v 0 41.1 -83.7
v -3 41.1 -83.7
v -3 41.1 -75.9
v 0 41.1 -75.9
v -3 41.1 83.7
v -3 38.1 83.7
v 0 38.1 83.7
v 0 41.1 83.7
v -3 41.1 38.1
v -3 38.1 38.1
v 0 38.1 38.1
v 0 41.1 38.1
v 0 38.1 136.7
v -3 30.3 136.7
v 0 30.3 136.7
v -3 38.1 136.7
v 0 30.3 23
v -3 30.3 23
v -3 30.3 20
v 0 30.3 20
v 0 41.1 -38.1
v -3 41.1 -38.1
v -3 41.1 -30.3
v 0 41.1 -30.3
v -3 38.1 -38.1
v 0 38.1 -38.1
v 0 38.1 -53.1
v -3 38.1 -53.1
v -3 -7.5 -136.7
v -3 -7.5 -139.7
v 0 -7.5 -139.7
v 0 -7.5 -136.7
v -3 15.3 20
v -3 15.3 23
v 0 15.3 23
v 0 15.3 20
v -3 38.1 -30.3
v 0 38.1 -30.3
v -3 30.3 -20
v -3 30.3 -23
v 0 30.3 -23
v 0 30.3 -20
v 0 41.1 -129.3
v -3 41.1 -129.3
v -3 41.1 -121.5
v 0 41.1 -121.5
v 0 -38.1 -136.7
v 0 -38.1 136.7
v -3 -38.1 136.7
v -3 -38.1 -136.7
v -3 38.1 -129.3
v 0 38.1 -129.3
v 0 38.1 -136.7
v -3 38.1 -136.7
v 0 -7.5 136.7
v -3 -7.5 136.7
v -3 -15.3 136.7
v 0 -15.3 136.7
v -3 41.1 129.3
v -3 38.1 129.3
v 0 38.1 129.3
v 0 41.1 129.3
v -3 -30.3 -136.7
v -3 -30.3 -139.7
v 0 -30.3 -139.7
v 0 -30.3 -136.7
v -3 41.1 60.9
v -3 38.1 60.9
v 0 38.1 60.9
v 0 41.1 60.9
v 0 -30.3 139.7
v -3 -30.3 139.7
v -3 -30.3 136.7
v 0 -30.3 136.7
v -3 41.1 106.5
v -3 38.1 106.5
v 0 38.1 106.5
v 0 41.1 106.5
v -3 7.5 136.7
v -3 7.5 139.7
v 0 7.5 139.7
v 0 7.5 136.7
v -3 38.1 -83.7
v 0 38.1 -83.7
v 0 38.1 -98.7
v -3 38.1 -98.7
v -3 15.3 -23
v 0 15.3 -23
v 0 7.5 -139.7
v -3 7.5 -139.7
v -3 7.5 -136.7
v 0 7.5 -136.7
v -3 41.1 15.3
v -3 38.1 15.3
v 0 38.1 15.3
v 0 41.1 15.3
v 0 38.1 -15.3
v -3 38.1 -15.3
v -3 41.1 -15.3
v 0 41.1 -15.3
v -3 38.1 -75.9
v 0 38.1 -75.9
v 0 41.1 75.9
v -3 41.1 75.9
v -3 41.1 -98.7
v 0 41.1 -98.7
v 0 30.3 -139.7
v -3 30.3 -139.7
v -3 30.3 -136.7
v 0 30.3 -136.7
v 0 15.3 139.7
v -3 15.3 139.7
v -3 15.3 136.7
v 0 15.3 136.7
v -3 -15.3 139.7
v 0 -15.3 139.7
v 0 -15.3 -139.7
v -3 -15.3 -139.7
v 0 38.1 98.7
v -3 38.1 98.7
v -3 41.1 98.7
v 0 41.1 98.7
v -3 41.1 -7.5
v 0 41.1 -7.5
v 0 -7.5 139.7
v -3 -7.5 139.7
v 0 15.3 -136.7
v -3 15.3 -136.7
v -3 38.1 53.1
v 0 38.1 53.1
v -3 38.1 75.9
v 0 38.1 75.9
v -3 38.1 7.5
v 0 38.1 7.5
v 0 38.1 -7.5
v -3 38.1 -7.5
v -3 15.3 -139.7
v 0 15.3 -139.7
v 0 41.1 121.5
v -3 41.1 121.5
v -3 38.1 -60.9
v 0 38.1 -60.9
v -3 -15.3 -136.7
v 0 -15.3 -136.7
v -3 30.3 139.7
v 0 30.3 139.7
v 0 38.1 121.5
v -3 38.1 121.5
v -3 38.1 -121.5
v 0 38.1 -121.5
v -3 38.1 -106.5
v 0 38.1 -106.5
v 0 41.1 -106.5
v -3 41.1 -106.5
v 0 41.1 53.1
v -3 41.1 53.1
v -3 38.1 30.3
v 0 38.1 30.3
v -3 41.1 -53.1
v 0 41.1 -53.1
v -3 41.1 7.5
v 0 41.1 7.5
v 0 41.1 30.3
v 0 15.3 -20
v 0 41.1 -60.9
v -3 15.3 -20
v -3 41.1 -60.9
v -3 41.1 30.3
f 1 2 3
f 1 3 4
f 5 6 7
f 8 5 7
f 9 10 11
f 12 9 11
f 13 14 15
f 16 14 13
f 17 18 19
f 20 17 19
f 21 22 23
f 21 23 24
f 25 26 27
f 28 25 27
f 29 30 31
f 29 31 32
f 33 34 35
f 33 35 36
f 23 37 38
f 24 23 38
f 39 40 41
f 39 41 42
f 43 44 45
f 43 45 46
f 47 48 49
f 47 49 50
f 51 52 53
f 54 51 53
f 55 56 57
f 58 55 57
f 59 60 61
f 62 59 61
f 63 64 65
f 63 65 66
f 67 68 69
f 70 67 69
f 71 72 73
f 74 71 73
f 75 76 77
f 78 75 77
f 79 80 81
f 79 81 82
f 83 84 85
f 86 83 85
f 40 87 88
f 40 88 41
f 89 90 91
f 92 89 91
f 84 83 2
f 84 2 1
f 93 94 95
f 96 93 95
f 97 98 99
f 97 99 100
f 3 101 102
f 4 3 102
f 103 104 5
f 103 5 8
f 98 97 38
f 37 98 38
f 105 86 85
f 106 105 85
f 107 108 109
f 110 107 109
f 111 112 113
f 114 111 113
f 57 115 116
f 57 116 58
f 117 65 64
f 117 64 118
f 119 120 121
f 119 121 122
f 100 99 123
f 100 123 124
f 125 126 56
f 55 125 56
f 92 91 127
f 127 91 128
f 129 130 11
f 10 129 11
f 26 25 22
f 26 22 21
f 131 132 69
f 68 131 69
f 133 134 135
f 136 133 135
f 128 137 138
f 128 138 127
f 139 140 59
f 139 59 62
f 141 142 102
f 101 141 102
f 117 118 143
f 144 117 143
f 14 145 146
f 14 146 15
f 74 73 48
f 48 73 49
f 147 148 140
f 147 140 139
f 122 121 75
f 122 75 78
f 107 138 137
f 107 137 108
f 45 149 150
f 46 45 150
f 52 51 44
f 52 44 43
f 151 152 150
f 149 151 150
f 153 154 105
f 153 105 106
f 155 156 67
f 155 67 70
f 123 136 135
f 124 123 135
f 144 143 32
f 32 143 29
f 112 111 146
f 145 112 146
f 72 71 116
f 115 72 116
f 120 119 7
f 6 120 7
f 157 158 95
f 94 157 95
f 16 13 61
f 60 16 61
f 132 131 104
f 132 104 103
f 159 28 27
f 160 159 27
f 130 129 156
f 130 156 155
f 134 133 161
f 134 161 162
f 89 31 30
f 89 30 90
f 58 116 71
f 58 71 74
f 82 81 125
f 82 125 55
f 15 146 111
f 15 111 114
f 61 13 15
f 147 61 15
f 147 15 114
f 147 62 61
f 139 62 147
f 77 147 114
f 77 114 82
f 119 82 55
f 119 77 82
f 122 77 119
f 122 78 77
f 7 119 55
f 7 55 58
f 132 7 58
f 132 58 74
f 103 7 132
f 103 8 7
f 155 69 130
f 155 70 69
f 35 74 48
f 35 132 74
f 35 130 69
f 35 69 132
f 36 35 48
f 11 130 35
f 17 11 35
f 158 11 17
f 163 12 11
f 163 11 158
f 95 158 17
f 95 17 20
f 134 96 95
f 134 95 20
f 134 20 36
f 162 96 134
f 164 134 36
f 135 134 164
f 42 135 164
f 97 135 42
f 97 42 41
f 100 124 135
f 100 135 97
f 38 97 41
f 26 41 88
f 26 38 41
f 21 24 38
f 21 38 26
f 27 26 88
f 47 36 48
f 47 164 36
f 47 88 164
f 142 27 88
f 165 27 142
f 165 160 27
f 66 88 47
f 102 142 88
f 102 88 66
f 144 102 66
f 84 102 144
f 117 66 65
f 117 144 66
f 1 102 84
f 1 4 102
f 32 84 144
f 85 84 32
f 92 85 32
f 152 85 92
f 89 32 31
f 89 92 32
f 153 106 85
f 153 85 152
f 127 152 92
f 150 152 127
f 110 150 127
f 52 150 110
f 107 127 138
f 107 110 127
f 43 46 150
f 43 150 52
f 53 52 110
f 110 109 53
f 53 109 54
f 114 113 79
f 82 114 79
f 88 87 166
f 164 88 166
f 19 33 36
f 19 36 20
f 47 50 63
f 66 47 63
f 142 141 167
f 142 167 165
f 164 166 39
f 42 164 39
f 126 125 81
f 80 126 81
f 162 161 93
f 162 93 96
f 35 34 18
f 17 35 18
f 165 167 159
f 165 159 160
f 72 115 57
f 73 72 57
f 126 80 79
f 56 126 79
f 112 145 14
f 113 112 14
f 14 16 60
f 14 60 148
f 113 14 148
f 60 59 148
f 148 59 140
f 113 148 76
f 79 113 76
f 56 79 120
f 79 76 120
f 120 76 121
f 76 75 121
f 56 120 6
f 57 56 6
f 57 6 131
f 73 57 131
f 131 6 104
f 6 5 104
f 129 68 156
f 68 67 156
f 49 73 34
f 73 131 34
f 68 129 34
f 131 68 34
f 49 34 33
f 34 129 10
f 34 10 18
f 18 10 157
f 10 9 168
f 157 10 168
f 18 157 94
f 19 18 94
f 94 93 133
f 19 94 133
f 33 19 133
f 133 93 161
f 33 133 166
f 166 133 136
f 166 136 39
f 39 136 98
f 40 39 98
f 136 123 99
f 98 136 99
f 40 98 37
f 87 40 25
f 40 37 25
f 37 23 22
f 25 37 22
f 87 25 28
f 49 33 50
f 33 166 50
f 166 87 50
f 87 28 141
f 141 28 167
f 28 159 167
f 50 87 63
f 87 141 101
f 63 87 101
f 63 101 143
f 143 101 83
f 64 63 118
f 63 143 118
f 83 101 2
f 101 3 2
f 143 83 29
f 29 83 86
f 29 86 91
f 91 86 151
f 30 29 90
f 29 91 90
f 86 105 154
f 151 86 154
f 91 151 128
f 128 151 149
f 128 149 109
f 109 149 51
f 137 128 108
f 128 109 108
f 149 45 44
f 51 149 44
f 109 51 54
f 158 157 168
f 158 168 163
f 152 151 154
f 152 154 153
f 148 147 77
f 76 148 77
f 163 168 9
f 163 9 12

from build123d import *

# Parameters (mm, degrees)
SKETCH1_W               = 279.4
SKETCH1_H               = 76.2
BOSS_EXTRUDE1_DEPTH     = 3
SKETCH3_W               = 3
SKETCH3_H               = 7.8
CUT_EXTRUDE1_DEPTH      = 145.833352512
LPATTERN1_COUNT         = 4
LPATTERN1_PITCH         = 22.8
MIRROR1_COPY_1_SKETCH_W = 3
MIRROR1_COPY_1_SKETCH_H = 7.8
MIRROR1_COPY_1_DEPTH    = 145.833352512
MIRROR1_COPY_2_SKETCH_W = 3
MIRROR1_COPY_2_SKETCH_H = 7.8
MIRROR1_COPY_2_DEPTH    = 145.833352512
MIRROR1_COPY_3_SKETCH_W = 3
MIRROR1_COPY_3_SKETCH_H = 7.8
MIRROR1_COPY_3_DEPTH    = 145.833352512
SKETCH5_W               = 3
SKETCH5_H               = 15
CUT_EXTRUDE3_DEPTH      = 10
SKETCH9_W               = 3
SKETCH9_H               = 7.8
BOSS_EXTRUDE2_DEPTH     = 3
LPATTERN4_COUNT         = 12
LPATTERN4_PITCH         = 22.8


with BuildPart() as part:
    # Sketch1 → Boss-Extrude1 (new body)
    with BuildSketch(Plane(origin=(0, 0, 0), x_dir=(0, 0, -1), z_dir=(1, 0, 0))):
        Rectangle(SKETCH1_W, SKETCH1_H)
    extrude(amount=-BOSS_EXTRUDE1_DEPTH)

    # Sketch3 → Cut-Extrude1 (cut, through all)
    with BuildSketch(Plane.ZY.offset(3)):
        with Locations((-138.2, 34.2)):
            Rectangle(SKETCH3_W, SKETCH3_H)
    cut_extrude1 = extrude(amount=-CUT_EXTRUDE1_DEPTH, mode=Mode.SUBTRACT)

    # LPattern1: Cut-Extrude1 ×4
    with Locations(*[(0, -i * LPATTERN1_PITCH, 0) for i in range(1, LPATTERN1_COUNT)]):
        add(cut_extrude1, mode=Mode.SUBTRACT)

    # Mirror1: Cut-Extrude1 across plane
    add(cut_extrude1.mirror(Plane.XY), mode=Mode.SUBTRACT)

    # Mirror1 copy 1 sketch → Mirror1 copy 1 (cut, through all)
    with BuildSketch(Plane(origin=(-3, -22.8, 0), x_dir=(0, 0, -1), z_dir=(-1, 0, 0))):
        with Locations((-138.2, -34.2)):
            Rectangle(MIRROR1_COPY_1_SKETCH_W, MIRROR1_COPY_1_SKETCH_H)
    extrude(amount=-MIRROR1_COPY_1_DEPTH, mode=Mode.SUBTRACT)

    # Mirror1 copy 2 sketch → Mirror1 copy 2 (cut, through all)
    with BuildSketch(Plane(origin=(-3, -45.6, 0), x_dir=(0, 0, -1), z_dir=(-1, 0, 0))):
        with Locations((-138.2, -34.2)):
            Rectangle(MIRROR1_COPY_2_SKETCH_W, MIRROR1_COPY_2_SKETCH_H)
    extrude(amount=-MIRROR1_COPY_2_DEPTH, mode=Mode.SUBTRACT)

    # Mirror1 copy 3 sketch → Mirror1 copy 3 (cut, through all)
    with BuildSketch(Plane(origin=(-3, -68.4, 0), x_dir=(0, 0, -1), z_dir=(-1, 0, 0))):
        with Locations((-138.2, -34.2)):
            Rectangle(MIRROR1_COPY_3_SKETCH_W, MIRROR1_COPY_3_SKETCH_H)
    extrude(amount=-MIRROR1_COPY_3_DEPTH, mode=Mode.SUBTRACT)

    # Sketch5 → Cut-Extrude3 (cut)
    with BuildSketch(Plane.ZY.offset(3)):
        with Locations((-21.5, 22.8)):
            Rectangle(SKETCH5_W, SKETCH5_H)
    cut_extrude3 = extrude(amount=-CUT_EXTRUDE3_DEPTH, mode=Mode.SUBTRACT)

    # Mirror2: Cut-Extrude3 across plane
    add(cut_extrude3.mirror(Plane.XY), mode=Mode.SUBTRACT)

    # Sketch9 → Boss-Extrude2 (add)
    with BuildSketch(Plane(origin=(0, 38.1, 0), x_dir=(1, 0, 0), z_dir=(0, 1, 0))):
        with Locations((-1.5, 125.4)):
            Rectangle(SKETCH9_W, SKETCH9_H)
    boss_extrude2 = extrude(amount=BOSS_EXTRUDE2_DEPTH)

    # LPattern4: Boss-Extrude2 ×12
    with Locations(*[(0, 0, i * LPATTERN4_PITCH) for i in range(1, LPATTERN4_COUNT)]):
        add(boss_extrude2)


solid = part.part
